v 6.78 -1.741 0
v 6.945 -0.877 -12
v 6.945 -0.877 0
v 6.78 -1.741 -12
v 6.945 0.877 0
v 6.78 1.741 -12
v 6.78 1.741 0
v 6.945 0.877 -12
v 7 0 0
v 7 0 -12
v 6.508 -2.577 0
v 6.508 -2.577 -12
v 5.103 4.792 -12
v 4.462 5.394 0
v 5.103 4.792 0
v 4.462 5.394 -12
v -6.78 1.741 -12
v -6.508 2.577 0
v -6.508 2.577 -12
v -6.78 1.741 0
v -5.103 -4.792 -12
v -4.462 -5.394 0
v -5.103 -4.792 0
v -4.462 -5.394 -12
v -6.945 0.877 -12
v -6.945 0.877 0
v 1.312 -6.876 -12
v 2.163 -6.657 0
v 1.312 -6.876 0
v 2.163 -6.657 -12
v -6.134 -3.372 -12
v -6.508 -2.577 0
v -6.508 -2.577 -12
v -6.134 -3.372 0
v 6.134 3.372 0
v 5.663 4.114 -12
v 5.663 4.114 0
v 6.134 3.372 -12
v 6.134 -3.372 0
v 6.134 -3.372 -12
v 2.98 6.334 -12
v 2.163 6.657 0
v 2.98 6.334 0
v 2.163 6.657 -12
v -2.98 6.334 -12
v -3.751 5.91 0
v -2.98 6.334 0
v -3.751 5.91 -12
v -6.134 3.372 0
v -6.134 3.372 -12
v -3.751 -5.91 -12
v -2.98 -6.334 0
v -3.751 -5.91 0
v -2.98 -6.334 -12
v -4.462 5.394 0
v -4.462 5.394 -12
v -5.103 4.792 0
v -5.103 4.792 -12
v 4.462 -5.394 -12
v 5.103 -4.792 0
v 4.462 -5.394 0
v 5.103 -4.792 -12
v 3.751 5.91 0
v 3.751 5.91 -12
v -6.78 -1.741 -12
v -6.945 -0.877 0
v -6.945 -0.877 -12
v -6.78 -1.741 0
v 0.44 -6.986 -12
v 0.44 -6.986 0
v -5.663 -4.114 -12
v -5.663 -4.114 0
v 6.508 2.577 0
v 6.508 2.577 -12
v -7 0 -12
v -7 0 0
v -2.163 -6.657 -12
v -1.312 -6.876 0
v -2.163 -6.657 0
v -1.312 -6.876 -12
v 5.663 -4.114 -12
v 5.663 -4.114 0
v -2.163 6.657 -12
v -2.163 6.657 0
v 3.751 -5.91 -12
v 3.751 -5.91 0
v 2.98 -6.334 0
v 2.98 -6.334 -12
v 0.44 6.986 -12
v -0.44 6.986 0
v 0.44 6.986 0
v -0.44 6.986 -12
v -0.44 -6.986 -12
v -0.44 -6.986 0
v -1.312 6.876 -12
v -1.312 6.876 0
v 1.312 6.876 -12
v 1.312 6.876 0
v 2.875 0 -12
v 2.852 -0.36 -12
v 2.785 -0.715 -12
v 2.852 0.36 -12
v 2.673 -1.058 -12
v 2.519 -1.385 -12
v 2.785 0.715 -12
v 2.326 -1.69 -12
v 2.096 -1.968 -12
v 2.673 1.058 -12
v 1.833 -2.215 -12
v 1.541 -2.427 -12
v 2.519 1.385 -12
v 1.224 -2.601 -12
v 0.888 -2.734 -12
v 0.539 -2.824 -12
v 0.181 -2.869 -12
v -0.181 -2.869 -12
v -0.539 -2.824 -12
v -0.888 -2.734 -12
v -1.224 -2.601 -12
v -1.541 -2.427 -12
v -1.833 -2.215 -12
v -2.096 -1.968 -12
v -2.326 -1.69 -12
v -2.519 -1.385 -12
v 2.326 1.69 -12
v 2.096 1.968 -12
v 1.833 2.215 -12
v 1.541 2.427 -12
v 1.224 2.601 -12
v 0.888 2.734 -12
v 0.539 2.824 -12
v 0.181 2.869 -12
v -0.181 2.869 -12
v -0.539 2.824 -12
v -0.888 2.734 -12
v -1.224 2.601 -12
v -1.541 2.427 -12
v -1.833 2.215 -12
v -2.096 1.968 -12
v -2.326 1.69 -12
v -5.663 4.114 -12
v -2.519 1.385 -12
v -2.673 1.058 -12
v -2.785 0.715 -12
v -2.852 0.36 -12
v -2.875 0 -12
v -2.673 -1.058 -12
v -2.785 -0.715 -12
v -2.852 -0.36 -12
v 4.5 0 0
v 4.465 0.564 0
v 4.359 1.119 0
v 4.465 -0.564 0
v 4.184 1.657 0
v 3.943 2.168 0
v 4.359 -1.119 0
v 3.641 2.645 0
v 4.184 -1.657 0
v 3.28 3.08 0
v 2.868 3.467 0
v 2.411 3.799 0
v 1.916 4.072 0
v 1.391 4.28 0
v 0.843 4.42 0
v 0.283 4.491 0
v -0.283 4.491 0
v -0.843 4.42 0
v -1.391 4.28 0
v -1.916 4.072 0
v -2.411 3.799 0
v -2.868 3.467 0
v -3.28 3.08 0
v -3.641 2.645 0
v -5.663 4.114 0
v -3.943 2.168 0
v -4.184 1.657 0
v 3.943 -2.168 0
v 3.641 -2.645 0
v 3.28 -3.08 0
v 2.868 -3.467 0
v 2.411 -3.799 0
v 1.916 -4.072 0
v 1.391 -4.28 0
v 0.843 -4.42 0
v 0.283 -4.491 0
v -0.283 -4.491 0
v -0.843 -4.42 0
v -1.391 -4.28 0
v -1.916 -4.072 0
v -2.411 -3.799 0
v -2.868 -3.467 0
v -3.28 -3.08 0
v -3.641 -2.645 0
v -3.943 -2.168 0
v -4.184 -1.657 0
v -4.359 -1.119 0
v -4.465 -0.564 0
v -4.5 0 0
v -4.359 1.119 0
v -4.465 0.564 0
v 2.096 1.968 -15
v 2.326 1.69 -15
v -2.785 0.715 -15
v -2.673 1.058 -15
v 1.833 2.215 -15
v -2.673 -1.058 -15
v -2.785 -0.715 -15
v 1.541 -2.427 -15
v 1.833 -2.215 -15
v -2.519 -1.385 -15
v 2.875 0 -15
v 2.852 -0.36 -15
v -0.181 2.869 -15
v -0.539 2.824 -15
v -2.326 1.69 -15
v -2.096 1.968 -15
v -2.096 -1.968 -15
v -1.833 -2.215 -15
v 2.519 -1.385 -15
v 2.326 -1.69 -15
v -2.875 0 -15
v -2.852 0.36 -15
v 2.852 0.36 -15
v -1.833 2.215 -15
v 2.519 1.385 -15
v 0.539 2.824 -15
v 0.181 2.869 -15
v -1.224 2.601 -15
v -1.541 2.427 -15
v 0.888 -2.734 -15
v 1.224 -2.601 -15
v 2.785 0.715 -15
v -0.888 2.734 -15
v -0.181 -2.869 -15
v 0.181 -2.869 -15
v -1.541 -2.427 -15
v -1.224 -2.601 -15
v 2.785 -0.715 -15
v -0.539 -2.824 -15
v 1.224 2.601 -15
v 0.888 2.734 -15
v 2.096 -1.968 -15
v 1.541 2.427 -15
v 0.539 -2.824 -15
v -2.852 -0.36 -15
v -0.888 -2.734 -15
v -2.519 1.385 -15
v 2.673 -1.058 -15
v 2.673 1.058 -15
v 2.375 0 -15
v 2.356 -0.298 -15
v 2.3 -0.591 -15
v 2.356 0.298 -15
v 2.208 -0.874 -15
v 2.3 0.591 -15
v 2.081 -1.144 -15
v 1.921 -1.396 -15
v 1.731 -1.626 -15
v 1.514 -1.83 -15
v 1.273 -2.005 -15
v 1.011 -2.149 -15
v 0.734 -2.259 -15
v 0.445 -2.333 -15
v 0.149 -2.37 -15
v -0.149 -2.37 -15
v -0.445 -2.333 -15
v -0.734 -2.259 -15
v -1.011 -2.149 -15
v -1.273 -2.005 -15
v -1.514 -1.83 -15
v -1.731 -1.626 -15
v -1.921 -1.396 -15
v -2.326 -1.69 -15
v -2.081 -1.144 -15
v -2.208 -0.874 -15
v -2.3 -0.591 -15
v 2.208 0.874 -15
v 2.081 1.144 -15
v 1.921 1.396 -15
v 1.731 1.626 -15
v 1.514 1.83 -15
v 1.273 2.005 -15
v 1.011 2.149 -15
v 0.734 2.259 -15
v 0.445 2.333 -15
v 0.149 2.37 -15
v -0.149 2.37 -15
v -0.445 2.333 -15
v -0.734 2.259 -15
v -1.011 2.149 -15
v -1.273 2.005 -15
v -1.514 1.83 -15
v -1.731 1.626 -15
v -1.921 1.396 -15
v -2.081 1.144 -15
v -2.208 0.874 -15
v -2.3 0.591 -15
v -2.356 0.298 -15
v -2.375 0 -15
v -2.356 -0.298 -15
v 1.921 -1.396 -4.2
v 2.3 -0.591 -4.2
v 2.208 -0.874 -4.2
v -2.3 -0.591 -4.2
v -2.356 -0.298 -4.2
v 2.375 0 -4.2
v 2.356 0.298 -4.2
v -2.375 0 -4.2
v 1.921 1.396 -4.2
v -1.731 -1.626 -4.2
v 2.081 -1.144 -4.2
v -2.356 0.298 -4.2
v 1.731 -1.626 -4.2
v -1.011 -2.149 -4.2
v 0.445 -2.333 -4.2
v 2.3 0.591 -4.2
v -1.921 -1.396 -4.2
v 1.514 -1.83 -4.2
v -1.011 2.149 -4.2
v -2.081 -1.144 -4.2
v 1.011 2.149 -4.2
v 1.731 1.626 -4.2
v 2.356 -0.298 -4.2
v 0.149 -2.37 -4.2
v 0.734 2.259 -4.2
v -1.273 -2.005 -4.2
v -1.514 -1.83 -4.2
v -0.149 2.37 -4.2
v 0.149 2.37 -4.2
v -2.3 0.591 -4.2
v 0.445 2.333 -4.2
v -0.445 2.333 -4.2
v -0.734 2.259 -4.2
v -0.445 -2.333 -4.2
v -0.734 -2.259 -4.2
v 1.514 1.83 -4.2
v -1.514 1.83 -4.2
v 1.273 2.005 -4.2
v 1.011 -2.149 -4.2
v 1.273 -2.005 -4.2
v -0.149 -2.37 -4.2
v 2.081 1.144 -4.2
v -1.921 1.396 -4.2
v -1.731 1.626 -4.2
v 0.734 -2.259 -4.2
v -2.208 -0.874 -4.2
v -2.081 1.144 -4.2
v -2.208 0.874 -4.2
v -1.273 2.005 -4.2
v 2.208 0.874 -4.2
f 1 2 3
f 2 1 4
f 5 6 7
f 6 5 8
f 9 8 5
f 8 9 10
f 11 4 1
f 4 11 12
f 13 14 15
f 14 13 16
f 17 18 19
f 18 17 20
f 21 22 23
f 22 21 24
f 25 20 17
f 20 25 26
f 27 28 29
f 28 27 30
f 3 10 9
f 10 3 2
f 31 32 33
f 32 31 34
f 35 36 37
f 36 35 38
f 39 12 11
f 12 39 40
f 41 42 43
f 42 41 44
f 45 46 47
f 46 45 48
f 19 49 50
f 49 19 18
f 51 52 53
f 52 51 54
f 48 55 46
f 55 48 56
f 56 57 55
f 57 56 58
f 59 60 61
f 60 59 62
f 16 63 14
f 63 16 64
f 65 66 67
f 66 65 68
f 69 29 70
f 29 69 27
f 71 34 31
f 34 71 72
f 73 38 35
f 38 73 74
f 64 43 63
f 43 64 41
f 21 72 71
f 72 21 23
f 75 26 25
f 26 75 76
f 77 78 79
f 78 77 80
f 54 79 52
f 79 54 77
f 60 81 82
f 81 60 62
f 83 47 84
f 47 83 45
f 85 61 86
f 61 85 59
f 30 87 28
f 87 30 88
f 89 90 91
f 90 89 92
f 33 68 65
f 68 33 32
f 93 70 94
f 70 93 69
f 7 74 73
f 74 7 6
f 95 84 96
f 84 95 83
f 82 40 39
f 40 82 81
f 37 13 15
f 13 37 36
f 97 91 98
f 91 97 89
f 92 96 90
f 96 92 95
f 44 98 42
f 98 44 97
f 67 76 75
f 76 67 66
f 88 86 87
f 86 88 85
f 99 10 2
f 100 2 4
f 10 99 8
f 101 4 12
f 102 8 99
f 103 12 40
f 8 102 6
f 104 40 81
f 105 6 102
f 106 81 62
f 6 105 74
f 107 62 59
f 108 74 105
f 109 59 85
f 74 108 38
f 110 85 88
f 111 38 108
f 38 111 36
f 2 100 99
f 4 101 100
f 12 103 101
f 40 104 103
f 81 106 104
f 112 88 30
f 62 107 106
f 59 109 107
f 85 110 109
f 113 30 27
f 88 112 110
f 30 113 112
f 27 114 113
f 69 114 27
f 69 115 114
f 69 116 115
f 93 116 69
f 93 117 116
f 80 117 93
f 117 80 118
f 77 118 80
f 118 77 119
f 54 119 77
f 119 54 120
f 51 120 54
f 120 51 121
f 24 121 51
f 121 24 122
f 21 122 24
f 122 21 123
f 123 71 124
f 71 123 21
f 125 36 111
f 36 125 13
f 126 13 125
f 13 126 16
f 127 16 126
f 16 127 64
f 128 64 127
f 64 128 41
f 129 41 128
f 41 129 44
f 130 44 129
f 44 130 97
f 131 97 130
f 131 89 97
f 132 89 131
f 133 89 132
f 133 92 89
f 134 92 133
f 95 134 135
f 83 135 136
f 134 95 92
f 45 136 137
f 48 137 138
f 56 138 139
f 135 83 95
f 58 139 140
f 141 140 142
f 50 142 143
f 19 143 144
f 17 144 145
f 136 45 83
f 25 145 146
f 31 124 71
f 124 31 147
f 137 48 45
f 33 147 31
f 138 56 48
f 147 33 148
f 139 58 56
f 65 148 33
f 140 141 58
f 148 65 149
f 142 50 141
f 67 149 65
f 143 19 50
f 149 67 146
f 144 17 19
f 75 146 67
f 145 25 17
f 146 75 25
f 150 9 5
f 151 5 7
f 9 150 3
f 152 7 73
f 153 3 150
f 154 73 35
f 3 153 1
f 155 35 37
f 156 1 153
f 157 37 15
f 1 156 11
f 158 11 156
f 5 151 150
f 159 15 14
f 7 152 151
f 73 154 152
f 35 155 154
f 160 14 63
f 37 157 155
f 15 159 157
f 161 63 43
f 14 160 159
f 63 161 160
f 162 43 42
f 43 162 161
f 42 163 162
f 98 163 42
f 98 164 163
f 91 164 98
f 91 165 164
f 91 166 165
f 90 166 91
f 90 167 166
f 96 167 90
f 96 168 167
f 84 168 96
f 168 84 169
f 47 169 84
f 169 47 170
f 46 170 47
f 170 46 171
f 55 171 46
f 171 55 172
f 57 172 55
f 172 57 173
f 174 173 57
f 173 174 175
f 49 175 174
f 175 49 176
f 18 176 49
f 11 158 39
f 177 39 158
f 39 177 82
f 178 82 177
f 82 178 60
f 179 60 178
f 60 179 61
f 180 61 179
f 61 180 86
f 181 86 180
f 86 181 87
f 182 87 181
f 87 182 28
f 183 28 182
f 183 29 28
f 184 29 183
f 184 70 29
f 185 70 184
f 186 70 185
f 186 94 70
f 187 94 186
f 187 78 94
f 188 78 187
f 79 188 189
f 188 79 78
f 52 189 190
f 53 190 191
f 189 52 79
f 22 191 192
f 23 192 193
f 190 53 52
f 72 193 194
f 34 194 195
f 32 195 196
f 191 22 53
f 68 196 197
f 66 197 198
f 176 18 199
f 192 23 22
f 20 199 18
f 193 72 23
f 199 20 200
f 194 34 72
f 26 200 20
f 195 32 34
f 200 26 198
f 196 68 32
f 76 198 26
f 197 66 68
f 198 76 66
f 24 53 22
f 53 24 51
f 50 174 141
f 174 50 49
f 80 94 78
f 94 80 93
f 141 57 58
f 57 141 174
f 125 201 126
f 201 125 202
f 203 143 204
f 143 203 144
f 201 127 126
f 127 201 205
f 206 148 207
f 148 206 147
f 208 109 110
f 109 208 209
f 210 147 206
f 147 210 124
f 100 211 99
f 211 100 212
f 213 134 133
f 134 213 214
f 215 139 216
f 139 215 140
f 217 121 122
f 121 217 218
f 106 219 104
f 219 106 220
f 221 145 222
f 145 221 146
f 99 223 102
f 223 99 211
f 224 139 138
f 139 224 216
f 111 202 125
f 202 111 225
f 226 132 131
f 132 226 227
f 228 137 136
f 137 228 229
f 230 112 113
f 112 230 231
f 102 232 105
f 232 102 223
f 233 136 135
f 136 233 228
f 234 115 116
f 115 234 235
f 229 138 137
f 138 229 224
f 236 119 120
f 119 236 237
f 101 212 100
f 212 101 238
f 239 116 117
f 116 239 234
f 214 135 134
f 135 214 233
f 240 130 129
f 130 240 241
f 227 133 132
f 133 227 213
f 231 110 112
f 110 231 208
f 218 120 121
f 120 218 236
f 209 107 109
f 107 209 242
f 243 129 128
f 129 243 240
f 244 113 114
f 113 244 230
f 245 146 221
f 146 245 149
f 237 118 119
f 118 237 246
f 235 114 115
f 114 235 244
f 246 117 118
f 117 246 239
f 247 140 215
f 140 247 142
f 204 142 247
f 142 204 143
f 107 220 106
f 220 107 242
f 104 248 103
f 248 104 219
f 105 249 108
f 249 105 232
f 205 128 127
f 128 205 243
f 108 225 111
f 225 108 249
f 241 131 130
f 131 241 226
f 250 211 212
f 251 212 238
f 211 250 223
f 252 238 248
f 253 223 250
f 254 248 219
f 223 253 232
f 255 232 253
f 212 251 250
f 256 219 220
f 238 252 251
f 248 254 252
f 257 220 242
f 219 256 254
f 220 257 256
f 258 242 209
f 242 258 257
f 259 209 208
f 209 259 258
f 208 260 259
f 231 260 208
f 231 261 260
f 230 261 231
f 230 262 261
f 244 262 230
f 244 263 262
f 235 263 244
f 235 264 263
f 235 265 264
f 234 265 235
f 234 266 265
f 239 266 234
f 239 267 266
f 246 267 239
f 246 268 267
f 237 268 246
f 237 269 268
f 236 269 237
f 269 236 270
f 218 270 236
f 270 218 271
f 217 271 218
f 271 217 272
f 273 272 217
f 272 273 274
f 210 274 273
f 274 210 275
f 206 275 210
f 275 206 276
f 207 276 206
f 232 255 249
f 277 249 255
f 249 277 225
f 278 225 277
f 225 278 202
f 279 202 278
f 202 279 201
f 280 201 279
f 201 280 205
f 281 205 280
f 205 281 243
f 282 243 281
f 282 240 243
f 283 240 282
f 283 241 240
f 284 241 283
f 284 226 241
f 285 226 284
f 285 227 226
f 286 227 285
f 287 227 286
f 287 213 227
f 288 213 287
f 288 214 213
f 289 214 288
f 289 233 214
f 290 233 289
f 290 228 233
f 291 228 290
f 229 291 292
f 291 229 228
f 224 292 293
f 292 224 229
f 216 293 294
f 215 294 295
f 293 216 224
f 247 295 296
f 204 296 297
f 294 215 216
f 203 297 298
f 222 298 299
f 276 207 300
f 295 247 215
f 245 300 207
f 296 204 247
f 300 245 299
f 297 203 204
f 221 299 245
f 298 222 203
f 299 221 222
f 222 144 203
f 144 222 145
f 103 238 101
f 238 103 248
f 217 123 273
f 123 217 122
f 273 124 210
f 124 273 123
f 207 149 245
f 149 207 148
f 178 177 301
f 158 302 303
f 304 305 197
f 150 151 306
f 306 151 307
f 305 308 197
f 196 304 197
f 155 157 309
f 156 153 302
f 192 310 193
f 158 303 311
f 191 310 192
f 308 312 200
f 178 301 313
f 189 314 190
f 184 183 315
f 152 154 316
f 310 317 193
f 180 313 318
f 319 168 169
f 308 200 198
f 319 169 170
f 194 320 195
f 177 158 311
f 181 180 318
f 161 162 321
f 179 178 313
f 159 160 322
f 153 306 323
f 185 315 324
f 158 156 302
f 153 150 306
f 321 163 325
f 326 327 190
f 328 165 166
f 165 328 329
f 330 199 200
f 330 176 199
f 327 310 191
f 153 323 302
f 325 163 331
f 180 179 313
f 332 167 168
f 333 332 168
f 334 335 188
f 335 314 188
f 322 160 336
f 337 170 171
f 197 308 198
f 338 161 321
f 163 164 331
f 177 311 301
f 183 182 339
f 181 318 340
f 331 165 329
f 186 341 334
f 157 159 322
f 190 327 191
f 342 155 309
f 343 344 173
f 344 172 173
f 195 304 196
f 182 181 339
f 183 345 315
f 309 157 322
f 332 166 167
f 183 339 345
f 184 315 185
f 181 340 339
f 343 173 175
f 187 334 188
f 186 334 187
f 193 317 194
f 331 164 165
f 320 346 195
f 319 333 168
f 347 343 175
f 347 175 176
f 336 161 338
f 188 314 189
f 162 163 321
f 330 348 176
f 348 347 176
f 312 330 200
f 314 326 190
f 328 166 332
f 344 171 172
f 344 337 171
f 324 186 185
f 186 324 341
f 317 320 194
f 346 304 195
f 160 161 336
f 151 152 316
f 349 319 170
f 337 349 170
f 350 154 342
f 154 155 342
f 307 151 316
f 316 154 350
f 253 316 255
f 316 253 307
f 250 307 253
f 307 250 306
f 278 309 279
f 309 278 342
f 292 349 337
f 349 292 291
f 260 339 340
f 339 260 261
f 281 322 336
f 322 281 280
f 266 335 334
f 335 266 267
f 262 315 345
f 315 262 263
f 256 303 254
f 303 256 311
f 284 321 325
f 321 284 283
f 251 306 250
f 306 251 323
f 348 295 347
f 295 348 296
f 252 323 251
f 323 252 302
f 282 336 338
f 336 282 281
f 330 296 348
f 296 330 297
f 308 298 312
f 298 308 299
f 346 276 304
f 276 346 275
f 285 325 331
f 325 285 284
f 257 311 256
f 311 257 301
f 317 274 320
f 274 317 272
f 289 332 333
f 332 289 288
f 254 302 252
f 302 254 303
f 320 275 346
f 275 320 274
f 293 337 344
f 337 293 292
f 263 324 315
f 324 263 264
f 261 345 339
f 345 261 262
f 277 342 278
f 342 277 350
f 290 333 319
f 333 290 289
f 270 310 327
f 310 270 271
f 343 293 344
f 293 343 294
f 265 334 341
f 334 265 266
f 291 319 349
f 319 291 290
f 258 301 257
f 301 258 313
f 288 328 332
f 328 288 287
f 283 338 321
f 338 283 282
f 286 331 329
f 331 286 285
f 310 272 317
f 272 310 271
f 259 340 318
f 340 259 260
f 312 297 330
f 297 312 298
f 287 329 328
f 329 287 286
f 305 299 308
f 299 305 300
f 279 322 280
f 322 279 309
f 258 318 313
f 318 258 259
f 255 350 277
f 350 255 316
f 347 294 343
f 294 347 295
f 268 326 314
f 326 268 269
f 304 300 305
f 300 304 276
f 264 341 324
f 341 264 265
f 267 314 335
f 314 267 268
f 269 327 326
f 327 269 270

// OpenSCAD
$fn = 50;

difference() {
	union() {
		translate(v = [0, 0, -12.0]) {
			cylinder(h = 12, r = 7.0);
		}
		#translate(v = [0, 0, -15.0]) {
			cylinder(h = 15, r = 2.875);
		}
	}
	union() {
		translate(v = [0, 0, 0]) {
			rotate(a = [0, 0, 0]) {
				difference() {
					union() {
						translate(v = [0, 0, -15.0]) {
							cylinder(h = 15, r = 2.25);
						}
						translate(v = [0, 0, -4.2]) {
							cylinder(h = 4.2, r1 = 2.375, r2 = 4.5);
						}
						translate(v = [0, 0, -15.0]) {
							cylinder(h = 15, r = 2.375);
						}
						translate(v = [0, 0, -15.0]) {
							cylinder(h = 15, r = 2.25);
						}
					}
					union();
				}
			}
		}
	}
}
